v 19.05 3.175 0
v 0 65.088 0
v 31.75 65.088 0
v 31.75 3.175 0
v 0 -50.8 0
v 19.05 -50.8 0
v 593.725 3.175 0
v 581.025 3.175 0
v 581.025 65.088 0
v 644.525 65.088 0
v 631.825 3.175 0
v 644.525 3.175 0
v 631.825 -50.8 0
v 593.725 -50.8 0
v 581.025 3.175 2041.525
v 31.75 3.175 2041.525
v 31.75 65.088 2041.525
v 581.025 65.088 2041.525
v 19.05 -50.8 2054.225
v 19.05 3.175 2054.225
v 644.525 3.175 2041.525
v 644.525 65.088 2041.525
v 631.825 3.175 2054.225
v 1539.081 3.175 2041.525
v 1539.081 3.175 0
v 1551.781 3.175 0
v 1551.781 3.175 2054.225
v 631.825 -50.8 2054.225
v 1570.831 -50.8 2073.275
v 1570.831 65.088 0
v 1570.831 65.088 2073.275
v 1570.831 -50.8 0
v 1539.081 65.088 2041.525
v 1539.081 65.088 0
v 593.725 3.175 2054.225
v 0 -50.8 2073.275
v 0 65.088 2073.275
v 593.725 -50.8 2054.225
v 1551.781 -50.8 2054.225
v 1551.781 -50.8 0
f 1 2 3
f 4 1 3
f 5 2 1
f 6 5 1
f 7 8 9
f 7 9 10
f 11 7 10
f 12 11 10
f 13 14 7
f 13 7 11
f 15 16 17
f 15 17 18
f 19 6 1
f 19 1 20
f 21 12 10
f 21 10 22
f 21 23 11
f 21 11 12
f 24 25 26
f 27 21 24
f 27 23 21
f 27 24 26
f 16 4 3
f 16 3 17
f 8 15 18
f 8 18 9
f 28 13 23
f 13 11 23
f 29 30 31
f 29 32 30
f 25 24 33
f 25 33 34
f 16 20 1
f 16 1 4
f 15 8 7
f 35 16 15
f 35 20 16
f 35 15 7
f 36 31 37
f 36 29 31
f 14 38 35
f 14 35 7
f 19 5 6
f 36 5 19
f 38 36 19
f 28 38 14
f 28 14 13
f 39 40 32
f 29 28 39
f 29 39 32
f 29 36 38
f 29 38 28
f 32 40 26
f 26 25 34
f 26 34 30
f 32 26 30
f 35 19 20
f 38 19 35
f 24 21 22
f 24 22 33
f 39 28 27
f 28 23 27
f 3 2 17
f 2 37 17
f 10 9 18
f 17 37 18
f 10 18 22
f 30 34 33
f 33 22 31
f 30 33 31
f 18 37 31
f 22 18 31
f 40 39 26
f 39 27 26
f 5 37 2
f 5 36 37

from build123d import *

# Parameters (mm, degrees)
F3_DEPTH      = 61.9125
F5_DEPTH      = 50.8
F5_DEPTH_BACK = 3.175


with BuildPart() as f3:
    # F2 (on offset) → F3 (new body)
    with BuildSketch(Plane.XZ.offset(-3.175)):
        Polygon((0, 2054.225), (0, 0), (19.05, 0), (31.75, 0), (31.75, 2041.525), (581.025, 2041.525), (581.025, 0), (593.725, 0), (612.775, 0), (631.825, 0), (644.525, 0), (644.525, 2041.525), (1539.08125, 2041.525), (1539.08125, 0), (1551.78125, 0), (1570.83125, 0), (1570.83125, 2073.275), (0, 2073.275), align=None)
    extrude(amount=-F3_DEPTH)

    # F4 (on Front) → F5 (join, two sides)
    with BuildSketch(Plane.XZ) as f5_sk:
        Polygon((0, 2054.225), (0, 0), (19.05, 0), (19.05, 2041.525), (19.05, 2054.225), (593.725, 2054.225), (593.725, 0), (612.775, 0), (631.825, 0), (631.825, 2054.225), (1551.78125, 2054.225), (1551.78125, 2041.525), (1551.78125, 0), (1570.83125, 0), (1570.83125, 2073.275), (0, 2073.275), align=None)
    extrude(amount=F5_DEPTH)
    extrude(f5_sk.sketch, amount=-F5_DEPTH_BACK)


solid = f3.part
